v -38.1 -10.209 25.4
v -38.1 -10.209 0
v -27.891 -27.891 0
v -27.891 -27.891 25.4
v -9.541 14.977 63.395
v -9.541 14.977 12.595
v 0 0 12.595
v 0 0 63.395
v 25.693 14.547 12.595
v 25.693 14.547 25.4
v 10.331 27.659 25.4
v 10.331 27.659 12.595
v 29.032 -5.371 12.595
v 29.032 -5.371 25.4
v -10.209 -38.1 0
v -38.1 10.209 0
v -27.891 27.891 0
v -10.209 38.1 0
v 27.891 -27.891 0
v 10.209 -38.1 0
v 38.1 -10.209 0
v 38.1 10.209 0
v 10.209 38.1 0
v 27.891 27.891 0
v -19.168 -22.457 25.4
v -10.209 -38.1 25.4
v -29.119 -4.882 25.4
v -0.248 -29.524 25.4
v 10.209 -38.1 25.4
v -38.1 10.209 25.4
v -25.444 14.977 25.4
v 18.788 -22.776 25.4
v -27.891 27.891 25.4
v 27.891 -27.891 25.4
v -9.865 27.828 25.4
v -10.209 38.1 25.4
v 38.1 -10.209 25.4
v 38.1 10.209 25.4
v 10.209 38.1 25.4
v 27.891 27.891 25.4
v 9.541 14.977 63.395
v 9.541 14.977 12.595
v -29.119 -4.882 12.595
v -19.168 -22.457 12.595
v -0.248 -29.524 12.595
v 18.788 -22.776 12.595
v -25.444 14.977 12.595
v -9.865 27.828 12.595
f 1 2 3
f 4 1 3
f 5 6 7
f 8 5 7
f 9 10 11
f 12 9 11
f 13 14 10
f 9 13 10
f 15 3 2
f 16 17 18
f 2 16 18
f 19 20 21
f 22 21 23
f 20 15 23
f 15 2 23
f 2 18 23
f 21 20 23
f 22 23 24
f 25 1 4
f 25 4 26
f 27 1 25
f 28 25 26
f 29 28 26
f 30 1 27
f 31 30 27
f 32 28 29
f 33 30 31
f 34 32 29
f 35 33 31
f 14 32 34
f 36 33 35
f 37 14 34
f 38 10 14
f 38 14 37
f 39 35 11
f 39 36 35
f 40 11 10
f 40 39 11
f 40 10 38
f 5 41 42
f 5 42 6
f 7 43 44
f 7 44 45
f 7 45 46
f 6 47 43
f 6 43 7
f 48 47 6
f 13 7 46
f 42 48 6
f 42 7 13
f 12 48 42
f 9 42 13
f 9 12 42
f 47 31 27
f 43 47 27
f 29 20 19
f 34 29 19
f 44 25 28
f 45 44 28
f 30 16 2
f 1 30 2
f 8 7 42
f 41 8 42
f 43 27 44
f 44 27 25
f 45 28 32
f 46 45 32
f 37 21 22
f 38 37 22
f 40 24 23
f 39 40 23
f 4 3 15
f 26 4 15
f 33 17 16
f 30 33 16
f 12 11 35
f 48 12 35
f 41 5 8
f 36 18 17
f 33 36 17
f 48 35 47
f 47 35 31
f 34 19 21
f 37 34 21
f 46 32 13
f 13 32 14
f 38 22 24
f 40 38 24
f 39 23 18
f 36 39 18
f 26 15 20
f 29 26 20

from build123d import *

# Parameters (mm, degrees)
F1_DEPTH = 25.4
F3_DEPTH = 12.80478
F5_DEPTH = 50.8


with BuildPart() as f1:
    # F0 (on Top) → F1 (new body)
    with BuildSketch(Plane.XY):
        Polygon((38.1, -10.208864), (38.1, 10.208864), (27.891136, 27.891136), (10.208864, 38.1), (-10.208864, 38.1), (-27.891136, 27.891136), (-38.1, 10.208864), (-38.1, -10.208864), (-27.891136, -27.891136), (-10.208864, -38.1), (10.208864, -38.1), (27.891136, -27.891136), align=None)
    extrude(amount=F1_DEPTH)

    # F2 (on face) → F3 (cut)
    with BuildSketch(Plane.XY.offset(25.4)):
        Polygon((18.787623, -22.776135), (29.032371, -5.37108), (25.692551, 14.547162), (10.3309, 27.658626), (-9.864694, 27.828311), (-25.444488, 14.97682), (-29.118523, -4.882491), (-19.167678, -22.457231), (-0.248063, -29.523983), align=None)
    extrude(amount=-F3_DEPTH, mode=Mode.SUBTRACT)

    # F4 (on face) → F5 (join)
    with BuildSketch(Plane.XY.offset(12.59522)):
        Polygon((-9.541287, 14.97682), (0, 0), (9.541287, 14.97682), align=None)
    extrude(amount=F5_DEPTH)


solid = f1.part
